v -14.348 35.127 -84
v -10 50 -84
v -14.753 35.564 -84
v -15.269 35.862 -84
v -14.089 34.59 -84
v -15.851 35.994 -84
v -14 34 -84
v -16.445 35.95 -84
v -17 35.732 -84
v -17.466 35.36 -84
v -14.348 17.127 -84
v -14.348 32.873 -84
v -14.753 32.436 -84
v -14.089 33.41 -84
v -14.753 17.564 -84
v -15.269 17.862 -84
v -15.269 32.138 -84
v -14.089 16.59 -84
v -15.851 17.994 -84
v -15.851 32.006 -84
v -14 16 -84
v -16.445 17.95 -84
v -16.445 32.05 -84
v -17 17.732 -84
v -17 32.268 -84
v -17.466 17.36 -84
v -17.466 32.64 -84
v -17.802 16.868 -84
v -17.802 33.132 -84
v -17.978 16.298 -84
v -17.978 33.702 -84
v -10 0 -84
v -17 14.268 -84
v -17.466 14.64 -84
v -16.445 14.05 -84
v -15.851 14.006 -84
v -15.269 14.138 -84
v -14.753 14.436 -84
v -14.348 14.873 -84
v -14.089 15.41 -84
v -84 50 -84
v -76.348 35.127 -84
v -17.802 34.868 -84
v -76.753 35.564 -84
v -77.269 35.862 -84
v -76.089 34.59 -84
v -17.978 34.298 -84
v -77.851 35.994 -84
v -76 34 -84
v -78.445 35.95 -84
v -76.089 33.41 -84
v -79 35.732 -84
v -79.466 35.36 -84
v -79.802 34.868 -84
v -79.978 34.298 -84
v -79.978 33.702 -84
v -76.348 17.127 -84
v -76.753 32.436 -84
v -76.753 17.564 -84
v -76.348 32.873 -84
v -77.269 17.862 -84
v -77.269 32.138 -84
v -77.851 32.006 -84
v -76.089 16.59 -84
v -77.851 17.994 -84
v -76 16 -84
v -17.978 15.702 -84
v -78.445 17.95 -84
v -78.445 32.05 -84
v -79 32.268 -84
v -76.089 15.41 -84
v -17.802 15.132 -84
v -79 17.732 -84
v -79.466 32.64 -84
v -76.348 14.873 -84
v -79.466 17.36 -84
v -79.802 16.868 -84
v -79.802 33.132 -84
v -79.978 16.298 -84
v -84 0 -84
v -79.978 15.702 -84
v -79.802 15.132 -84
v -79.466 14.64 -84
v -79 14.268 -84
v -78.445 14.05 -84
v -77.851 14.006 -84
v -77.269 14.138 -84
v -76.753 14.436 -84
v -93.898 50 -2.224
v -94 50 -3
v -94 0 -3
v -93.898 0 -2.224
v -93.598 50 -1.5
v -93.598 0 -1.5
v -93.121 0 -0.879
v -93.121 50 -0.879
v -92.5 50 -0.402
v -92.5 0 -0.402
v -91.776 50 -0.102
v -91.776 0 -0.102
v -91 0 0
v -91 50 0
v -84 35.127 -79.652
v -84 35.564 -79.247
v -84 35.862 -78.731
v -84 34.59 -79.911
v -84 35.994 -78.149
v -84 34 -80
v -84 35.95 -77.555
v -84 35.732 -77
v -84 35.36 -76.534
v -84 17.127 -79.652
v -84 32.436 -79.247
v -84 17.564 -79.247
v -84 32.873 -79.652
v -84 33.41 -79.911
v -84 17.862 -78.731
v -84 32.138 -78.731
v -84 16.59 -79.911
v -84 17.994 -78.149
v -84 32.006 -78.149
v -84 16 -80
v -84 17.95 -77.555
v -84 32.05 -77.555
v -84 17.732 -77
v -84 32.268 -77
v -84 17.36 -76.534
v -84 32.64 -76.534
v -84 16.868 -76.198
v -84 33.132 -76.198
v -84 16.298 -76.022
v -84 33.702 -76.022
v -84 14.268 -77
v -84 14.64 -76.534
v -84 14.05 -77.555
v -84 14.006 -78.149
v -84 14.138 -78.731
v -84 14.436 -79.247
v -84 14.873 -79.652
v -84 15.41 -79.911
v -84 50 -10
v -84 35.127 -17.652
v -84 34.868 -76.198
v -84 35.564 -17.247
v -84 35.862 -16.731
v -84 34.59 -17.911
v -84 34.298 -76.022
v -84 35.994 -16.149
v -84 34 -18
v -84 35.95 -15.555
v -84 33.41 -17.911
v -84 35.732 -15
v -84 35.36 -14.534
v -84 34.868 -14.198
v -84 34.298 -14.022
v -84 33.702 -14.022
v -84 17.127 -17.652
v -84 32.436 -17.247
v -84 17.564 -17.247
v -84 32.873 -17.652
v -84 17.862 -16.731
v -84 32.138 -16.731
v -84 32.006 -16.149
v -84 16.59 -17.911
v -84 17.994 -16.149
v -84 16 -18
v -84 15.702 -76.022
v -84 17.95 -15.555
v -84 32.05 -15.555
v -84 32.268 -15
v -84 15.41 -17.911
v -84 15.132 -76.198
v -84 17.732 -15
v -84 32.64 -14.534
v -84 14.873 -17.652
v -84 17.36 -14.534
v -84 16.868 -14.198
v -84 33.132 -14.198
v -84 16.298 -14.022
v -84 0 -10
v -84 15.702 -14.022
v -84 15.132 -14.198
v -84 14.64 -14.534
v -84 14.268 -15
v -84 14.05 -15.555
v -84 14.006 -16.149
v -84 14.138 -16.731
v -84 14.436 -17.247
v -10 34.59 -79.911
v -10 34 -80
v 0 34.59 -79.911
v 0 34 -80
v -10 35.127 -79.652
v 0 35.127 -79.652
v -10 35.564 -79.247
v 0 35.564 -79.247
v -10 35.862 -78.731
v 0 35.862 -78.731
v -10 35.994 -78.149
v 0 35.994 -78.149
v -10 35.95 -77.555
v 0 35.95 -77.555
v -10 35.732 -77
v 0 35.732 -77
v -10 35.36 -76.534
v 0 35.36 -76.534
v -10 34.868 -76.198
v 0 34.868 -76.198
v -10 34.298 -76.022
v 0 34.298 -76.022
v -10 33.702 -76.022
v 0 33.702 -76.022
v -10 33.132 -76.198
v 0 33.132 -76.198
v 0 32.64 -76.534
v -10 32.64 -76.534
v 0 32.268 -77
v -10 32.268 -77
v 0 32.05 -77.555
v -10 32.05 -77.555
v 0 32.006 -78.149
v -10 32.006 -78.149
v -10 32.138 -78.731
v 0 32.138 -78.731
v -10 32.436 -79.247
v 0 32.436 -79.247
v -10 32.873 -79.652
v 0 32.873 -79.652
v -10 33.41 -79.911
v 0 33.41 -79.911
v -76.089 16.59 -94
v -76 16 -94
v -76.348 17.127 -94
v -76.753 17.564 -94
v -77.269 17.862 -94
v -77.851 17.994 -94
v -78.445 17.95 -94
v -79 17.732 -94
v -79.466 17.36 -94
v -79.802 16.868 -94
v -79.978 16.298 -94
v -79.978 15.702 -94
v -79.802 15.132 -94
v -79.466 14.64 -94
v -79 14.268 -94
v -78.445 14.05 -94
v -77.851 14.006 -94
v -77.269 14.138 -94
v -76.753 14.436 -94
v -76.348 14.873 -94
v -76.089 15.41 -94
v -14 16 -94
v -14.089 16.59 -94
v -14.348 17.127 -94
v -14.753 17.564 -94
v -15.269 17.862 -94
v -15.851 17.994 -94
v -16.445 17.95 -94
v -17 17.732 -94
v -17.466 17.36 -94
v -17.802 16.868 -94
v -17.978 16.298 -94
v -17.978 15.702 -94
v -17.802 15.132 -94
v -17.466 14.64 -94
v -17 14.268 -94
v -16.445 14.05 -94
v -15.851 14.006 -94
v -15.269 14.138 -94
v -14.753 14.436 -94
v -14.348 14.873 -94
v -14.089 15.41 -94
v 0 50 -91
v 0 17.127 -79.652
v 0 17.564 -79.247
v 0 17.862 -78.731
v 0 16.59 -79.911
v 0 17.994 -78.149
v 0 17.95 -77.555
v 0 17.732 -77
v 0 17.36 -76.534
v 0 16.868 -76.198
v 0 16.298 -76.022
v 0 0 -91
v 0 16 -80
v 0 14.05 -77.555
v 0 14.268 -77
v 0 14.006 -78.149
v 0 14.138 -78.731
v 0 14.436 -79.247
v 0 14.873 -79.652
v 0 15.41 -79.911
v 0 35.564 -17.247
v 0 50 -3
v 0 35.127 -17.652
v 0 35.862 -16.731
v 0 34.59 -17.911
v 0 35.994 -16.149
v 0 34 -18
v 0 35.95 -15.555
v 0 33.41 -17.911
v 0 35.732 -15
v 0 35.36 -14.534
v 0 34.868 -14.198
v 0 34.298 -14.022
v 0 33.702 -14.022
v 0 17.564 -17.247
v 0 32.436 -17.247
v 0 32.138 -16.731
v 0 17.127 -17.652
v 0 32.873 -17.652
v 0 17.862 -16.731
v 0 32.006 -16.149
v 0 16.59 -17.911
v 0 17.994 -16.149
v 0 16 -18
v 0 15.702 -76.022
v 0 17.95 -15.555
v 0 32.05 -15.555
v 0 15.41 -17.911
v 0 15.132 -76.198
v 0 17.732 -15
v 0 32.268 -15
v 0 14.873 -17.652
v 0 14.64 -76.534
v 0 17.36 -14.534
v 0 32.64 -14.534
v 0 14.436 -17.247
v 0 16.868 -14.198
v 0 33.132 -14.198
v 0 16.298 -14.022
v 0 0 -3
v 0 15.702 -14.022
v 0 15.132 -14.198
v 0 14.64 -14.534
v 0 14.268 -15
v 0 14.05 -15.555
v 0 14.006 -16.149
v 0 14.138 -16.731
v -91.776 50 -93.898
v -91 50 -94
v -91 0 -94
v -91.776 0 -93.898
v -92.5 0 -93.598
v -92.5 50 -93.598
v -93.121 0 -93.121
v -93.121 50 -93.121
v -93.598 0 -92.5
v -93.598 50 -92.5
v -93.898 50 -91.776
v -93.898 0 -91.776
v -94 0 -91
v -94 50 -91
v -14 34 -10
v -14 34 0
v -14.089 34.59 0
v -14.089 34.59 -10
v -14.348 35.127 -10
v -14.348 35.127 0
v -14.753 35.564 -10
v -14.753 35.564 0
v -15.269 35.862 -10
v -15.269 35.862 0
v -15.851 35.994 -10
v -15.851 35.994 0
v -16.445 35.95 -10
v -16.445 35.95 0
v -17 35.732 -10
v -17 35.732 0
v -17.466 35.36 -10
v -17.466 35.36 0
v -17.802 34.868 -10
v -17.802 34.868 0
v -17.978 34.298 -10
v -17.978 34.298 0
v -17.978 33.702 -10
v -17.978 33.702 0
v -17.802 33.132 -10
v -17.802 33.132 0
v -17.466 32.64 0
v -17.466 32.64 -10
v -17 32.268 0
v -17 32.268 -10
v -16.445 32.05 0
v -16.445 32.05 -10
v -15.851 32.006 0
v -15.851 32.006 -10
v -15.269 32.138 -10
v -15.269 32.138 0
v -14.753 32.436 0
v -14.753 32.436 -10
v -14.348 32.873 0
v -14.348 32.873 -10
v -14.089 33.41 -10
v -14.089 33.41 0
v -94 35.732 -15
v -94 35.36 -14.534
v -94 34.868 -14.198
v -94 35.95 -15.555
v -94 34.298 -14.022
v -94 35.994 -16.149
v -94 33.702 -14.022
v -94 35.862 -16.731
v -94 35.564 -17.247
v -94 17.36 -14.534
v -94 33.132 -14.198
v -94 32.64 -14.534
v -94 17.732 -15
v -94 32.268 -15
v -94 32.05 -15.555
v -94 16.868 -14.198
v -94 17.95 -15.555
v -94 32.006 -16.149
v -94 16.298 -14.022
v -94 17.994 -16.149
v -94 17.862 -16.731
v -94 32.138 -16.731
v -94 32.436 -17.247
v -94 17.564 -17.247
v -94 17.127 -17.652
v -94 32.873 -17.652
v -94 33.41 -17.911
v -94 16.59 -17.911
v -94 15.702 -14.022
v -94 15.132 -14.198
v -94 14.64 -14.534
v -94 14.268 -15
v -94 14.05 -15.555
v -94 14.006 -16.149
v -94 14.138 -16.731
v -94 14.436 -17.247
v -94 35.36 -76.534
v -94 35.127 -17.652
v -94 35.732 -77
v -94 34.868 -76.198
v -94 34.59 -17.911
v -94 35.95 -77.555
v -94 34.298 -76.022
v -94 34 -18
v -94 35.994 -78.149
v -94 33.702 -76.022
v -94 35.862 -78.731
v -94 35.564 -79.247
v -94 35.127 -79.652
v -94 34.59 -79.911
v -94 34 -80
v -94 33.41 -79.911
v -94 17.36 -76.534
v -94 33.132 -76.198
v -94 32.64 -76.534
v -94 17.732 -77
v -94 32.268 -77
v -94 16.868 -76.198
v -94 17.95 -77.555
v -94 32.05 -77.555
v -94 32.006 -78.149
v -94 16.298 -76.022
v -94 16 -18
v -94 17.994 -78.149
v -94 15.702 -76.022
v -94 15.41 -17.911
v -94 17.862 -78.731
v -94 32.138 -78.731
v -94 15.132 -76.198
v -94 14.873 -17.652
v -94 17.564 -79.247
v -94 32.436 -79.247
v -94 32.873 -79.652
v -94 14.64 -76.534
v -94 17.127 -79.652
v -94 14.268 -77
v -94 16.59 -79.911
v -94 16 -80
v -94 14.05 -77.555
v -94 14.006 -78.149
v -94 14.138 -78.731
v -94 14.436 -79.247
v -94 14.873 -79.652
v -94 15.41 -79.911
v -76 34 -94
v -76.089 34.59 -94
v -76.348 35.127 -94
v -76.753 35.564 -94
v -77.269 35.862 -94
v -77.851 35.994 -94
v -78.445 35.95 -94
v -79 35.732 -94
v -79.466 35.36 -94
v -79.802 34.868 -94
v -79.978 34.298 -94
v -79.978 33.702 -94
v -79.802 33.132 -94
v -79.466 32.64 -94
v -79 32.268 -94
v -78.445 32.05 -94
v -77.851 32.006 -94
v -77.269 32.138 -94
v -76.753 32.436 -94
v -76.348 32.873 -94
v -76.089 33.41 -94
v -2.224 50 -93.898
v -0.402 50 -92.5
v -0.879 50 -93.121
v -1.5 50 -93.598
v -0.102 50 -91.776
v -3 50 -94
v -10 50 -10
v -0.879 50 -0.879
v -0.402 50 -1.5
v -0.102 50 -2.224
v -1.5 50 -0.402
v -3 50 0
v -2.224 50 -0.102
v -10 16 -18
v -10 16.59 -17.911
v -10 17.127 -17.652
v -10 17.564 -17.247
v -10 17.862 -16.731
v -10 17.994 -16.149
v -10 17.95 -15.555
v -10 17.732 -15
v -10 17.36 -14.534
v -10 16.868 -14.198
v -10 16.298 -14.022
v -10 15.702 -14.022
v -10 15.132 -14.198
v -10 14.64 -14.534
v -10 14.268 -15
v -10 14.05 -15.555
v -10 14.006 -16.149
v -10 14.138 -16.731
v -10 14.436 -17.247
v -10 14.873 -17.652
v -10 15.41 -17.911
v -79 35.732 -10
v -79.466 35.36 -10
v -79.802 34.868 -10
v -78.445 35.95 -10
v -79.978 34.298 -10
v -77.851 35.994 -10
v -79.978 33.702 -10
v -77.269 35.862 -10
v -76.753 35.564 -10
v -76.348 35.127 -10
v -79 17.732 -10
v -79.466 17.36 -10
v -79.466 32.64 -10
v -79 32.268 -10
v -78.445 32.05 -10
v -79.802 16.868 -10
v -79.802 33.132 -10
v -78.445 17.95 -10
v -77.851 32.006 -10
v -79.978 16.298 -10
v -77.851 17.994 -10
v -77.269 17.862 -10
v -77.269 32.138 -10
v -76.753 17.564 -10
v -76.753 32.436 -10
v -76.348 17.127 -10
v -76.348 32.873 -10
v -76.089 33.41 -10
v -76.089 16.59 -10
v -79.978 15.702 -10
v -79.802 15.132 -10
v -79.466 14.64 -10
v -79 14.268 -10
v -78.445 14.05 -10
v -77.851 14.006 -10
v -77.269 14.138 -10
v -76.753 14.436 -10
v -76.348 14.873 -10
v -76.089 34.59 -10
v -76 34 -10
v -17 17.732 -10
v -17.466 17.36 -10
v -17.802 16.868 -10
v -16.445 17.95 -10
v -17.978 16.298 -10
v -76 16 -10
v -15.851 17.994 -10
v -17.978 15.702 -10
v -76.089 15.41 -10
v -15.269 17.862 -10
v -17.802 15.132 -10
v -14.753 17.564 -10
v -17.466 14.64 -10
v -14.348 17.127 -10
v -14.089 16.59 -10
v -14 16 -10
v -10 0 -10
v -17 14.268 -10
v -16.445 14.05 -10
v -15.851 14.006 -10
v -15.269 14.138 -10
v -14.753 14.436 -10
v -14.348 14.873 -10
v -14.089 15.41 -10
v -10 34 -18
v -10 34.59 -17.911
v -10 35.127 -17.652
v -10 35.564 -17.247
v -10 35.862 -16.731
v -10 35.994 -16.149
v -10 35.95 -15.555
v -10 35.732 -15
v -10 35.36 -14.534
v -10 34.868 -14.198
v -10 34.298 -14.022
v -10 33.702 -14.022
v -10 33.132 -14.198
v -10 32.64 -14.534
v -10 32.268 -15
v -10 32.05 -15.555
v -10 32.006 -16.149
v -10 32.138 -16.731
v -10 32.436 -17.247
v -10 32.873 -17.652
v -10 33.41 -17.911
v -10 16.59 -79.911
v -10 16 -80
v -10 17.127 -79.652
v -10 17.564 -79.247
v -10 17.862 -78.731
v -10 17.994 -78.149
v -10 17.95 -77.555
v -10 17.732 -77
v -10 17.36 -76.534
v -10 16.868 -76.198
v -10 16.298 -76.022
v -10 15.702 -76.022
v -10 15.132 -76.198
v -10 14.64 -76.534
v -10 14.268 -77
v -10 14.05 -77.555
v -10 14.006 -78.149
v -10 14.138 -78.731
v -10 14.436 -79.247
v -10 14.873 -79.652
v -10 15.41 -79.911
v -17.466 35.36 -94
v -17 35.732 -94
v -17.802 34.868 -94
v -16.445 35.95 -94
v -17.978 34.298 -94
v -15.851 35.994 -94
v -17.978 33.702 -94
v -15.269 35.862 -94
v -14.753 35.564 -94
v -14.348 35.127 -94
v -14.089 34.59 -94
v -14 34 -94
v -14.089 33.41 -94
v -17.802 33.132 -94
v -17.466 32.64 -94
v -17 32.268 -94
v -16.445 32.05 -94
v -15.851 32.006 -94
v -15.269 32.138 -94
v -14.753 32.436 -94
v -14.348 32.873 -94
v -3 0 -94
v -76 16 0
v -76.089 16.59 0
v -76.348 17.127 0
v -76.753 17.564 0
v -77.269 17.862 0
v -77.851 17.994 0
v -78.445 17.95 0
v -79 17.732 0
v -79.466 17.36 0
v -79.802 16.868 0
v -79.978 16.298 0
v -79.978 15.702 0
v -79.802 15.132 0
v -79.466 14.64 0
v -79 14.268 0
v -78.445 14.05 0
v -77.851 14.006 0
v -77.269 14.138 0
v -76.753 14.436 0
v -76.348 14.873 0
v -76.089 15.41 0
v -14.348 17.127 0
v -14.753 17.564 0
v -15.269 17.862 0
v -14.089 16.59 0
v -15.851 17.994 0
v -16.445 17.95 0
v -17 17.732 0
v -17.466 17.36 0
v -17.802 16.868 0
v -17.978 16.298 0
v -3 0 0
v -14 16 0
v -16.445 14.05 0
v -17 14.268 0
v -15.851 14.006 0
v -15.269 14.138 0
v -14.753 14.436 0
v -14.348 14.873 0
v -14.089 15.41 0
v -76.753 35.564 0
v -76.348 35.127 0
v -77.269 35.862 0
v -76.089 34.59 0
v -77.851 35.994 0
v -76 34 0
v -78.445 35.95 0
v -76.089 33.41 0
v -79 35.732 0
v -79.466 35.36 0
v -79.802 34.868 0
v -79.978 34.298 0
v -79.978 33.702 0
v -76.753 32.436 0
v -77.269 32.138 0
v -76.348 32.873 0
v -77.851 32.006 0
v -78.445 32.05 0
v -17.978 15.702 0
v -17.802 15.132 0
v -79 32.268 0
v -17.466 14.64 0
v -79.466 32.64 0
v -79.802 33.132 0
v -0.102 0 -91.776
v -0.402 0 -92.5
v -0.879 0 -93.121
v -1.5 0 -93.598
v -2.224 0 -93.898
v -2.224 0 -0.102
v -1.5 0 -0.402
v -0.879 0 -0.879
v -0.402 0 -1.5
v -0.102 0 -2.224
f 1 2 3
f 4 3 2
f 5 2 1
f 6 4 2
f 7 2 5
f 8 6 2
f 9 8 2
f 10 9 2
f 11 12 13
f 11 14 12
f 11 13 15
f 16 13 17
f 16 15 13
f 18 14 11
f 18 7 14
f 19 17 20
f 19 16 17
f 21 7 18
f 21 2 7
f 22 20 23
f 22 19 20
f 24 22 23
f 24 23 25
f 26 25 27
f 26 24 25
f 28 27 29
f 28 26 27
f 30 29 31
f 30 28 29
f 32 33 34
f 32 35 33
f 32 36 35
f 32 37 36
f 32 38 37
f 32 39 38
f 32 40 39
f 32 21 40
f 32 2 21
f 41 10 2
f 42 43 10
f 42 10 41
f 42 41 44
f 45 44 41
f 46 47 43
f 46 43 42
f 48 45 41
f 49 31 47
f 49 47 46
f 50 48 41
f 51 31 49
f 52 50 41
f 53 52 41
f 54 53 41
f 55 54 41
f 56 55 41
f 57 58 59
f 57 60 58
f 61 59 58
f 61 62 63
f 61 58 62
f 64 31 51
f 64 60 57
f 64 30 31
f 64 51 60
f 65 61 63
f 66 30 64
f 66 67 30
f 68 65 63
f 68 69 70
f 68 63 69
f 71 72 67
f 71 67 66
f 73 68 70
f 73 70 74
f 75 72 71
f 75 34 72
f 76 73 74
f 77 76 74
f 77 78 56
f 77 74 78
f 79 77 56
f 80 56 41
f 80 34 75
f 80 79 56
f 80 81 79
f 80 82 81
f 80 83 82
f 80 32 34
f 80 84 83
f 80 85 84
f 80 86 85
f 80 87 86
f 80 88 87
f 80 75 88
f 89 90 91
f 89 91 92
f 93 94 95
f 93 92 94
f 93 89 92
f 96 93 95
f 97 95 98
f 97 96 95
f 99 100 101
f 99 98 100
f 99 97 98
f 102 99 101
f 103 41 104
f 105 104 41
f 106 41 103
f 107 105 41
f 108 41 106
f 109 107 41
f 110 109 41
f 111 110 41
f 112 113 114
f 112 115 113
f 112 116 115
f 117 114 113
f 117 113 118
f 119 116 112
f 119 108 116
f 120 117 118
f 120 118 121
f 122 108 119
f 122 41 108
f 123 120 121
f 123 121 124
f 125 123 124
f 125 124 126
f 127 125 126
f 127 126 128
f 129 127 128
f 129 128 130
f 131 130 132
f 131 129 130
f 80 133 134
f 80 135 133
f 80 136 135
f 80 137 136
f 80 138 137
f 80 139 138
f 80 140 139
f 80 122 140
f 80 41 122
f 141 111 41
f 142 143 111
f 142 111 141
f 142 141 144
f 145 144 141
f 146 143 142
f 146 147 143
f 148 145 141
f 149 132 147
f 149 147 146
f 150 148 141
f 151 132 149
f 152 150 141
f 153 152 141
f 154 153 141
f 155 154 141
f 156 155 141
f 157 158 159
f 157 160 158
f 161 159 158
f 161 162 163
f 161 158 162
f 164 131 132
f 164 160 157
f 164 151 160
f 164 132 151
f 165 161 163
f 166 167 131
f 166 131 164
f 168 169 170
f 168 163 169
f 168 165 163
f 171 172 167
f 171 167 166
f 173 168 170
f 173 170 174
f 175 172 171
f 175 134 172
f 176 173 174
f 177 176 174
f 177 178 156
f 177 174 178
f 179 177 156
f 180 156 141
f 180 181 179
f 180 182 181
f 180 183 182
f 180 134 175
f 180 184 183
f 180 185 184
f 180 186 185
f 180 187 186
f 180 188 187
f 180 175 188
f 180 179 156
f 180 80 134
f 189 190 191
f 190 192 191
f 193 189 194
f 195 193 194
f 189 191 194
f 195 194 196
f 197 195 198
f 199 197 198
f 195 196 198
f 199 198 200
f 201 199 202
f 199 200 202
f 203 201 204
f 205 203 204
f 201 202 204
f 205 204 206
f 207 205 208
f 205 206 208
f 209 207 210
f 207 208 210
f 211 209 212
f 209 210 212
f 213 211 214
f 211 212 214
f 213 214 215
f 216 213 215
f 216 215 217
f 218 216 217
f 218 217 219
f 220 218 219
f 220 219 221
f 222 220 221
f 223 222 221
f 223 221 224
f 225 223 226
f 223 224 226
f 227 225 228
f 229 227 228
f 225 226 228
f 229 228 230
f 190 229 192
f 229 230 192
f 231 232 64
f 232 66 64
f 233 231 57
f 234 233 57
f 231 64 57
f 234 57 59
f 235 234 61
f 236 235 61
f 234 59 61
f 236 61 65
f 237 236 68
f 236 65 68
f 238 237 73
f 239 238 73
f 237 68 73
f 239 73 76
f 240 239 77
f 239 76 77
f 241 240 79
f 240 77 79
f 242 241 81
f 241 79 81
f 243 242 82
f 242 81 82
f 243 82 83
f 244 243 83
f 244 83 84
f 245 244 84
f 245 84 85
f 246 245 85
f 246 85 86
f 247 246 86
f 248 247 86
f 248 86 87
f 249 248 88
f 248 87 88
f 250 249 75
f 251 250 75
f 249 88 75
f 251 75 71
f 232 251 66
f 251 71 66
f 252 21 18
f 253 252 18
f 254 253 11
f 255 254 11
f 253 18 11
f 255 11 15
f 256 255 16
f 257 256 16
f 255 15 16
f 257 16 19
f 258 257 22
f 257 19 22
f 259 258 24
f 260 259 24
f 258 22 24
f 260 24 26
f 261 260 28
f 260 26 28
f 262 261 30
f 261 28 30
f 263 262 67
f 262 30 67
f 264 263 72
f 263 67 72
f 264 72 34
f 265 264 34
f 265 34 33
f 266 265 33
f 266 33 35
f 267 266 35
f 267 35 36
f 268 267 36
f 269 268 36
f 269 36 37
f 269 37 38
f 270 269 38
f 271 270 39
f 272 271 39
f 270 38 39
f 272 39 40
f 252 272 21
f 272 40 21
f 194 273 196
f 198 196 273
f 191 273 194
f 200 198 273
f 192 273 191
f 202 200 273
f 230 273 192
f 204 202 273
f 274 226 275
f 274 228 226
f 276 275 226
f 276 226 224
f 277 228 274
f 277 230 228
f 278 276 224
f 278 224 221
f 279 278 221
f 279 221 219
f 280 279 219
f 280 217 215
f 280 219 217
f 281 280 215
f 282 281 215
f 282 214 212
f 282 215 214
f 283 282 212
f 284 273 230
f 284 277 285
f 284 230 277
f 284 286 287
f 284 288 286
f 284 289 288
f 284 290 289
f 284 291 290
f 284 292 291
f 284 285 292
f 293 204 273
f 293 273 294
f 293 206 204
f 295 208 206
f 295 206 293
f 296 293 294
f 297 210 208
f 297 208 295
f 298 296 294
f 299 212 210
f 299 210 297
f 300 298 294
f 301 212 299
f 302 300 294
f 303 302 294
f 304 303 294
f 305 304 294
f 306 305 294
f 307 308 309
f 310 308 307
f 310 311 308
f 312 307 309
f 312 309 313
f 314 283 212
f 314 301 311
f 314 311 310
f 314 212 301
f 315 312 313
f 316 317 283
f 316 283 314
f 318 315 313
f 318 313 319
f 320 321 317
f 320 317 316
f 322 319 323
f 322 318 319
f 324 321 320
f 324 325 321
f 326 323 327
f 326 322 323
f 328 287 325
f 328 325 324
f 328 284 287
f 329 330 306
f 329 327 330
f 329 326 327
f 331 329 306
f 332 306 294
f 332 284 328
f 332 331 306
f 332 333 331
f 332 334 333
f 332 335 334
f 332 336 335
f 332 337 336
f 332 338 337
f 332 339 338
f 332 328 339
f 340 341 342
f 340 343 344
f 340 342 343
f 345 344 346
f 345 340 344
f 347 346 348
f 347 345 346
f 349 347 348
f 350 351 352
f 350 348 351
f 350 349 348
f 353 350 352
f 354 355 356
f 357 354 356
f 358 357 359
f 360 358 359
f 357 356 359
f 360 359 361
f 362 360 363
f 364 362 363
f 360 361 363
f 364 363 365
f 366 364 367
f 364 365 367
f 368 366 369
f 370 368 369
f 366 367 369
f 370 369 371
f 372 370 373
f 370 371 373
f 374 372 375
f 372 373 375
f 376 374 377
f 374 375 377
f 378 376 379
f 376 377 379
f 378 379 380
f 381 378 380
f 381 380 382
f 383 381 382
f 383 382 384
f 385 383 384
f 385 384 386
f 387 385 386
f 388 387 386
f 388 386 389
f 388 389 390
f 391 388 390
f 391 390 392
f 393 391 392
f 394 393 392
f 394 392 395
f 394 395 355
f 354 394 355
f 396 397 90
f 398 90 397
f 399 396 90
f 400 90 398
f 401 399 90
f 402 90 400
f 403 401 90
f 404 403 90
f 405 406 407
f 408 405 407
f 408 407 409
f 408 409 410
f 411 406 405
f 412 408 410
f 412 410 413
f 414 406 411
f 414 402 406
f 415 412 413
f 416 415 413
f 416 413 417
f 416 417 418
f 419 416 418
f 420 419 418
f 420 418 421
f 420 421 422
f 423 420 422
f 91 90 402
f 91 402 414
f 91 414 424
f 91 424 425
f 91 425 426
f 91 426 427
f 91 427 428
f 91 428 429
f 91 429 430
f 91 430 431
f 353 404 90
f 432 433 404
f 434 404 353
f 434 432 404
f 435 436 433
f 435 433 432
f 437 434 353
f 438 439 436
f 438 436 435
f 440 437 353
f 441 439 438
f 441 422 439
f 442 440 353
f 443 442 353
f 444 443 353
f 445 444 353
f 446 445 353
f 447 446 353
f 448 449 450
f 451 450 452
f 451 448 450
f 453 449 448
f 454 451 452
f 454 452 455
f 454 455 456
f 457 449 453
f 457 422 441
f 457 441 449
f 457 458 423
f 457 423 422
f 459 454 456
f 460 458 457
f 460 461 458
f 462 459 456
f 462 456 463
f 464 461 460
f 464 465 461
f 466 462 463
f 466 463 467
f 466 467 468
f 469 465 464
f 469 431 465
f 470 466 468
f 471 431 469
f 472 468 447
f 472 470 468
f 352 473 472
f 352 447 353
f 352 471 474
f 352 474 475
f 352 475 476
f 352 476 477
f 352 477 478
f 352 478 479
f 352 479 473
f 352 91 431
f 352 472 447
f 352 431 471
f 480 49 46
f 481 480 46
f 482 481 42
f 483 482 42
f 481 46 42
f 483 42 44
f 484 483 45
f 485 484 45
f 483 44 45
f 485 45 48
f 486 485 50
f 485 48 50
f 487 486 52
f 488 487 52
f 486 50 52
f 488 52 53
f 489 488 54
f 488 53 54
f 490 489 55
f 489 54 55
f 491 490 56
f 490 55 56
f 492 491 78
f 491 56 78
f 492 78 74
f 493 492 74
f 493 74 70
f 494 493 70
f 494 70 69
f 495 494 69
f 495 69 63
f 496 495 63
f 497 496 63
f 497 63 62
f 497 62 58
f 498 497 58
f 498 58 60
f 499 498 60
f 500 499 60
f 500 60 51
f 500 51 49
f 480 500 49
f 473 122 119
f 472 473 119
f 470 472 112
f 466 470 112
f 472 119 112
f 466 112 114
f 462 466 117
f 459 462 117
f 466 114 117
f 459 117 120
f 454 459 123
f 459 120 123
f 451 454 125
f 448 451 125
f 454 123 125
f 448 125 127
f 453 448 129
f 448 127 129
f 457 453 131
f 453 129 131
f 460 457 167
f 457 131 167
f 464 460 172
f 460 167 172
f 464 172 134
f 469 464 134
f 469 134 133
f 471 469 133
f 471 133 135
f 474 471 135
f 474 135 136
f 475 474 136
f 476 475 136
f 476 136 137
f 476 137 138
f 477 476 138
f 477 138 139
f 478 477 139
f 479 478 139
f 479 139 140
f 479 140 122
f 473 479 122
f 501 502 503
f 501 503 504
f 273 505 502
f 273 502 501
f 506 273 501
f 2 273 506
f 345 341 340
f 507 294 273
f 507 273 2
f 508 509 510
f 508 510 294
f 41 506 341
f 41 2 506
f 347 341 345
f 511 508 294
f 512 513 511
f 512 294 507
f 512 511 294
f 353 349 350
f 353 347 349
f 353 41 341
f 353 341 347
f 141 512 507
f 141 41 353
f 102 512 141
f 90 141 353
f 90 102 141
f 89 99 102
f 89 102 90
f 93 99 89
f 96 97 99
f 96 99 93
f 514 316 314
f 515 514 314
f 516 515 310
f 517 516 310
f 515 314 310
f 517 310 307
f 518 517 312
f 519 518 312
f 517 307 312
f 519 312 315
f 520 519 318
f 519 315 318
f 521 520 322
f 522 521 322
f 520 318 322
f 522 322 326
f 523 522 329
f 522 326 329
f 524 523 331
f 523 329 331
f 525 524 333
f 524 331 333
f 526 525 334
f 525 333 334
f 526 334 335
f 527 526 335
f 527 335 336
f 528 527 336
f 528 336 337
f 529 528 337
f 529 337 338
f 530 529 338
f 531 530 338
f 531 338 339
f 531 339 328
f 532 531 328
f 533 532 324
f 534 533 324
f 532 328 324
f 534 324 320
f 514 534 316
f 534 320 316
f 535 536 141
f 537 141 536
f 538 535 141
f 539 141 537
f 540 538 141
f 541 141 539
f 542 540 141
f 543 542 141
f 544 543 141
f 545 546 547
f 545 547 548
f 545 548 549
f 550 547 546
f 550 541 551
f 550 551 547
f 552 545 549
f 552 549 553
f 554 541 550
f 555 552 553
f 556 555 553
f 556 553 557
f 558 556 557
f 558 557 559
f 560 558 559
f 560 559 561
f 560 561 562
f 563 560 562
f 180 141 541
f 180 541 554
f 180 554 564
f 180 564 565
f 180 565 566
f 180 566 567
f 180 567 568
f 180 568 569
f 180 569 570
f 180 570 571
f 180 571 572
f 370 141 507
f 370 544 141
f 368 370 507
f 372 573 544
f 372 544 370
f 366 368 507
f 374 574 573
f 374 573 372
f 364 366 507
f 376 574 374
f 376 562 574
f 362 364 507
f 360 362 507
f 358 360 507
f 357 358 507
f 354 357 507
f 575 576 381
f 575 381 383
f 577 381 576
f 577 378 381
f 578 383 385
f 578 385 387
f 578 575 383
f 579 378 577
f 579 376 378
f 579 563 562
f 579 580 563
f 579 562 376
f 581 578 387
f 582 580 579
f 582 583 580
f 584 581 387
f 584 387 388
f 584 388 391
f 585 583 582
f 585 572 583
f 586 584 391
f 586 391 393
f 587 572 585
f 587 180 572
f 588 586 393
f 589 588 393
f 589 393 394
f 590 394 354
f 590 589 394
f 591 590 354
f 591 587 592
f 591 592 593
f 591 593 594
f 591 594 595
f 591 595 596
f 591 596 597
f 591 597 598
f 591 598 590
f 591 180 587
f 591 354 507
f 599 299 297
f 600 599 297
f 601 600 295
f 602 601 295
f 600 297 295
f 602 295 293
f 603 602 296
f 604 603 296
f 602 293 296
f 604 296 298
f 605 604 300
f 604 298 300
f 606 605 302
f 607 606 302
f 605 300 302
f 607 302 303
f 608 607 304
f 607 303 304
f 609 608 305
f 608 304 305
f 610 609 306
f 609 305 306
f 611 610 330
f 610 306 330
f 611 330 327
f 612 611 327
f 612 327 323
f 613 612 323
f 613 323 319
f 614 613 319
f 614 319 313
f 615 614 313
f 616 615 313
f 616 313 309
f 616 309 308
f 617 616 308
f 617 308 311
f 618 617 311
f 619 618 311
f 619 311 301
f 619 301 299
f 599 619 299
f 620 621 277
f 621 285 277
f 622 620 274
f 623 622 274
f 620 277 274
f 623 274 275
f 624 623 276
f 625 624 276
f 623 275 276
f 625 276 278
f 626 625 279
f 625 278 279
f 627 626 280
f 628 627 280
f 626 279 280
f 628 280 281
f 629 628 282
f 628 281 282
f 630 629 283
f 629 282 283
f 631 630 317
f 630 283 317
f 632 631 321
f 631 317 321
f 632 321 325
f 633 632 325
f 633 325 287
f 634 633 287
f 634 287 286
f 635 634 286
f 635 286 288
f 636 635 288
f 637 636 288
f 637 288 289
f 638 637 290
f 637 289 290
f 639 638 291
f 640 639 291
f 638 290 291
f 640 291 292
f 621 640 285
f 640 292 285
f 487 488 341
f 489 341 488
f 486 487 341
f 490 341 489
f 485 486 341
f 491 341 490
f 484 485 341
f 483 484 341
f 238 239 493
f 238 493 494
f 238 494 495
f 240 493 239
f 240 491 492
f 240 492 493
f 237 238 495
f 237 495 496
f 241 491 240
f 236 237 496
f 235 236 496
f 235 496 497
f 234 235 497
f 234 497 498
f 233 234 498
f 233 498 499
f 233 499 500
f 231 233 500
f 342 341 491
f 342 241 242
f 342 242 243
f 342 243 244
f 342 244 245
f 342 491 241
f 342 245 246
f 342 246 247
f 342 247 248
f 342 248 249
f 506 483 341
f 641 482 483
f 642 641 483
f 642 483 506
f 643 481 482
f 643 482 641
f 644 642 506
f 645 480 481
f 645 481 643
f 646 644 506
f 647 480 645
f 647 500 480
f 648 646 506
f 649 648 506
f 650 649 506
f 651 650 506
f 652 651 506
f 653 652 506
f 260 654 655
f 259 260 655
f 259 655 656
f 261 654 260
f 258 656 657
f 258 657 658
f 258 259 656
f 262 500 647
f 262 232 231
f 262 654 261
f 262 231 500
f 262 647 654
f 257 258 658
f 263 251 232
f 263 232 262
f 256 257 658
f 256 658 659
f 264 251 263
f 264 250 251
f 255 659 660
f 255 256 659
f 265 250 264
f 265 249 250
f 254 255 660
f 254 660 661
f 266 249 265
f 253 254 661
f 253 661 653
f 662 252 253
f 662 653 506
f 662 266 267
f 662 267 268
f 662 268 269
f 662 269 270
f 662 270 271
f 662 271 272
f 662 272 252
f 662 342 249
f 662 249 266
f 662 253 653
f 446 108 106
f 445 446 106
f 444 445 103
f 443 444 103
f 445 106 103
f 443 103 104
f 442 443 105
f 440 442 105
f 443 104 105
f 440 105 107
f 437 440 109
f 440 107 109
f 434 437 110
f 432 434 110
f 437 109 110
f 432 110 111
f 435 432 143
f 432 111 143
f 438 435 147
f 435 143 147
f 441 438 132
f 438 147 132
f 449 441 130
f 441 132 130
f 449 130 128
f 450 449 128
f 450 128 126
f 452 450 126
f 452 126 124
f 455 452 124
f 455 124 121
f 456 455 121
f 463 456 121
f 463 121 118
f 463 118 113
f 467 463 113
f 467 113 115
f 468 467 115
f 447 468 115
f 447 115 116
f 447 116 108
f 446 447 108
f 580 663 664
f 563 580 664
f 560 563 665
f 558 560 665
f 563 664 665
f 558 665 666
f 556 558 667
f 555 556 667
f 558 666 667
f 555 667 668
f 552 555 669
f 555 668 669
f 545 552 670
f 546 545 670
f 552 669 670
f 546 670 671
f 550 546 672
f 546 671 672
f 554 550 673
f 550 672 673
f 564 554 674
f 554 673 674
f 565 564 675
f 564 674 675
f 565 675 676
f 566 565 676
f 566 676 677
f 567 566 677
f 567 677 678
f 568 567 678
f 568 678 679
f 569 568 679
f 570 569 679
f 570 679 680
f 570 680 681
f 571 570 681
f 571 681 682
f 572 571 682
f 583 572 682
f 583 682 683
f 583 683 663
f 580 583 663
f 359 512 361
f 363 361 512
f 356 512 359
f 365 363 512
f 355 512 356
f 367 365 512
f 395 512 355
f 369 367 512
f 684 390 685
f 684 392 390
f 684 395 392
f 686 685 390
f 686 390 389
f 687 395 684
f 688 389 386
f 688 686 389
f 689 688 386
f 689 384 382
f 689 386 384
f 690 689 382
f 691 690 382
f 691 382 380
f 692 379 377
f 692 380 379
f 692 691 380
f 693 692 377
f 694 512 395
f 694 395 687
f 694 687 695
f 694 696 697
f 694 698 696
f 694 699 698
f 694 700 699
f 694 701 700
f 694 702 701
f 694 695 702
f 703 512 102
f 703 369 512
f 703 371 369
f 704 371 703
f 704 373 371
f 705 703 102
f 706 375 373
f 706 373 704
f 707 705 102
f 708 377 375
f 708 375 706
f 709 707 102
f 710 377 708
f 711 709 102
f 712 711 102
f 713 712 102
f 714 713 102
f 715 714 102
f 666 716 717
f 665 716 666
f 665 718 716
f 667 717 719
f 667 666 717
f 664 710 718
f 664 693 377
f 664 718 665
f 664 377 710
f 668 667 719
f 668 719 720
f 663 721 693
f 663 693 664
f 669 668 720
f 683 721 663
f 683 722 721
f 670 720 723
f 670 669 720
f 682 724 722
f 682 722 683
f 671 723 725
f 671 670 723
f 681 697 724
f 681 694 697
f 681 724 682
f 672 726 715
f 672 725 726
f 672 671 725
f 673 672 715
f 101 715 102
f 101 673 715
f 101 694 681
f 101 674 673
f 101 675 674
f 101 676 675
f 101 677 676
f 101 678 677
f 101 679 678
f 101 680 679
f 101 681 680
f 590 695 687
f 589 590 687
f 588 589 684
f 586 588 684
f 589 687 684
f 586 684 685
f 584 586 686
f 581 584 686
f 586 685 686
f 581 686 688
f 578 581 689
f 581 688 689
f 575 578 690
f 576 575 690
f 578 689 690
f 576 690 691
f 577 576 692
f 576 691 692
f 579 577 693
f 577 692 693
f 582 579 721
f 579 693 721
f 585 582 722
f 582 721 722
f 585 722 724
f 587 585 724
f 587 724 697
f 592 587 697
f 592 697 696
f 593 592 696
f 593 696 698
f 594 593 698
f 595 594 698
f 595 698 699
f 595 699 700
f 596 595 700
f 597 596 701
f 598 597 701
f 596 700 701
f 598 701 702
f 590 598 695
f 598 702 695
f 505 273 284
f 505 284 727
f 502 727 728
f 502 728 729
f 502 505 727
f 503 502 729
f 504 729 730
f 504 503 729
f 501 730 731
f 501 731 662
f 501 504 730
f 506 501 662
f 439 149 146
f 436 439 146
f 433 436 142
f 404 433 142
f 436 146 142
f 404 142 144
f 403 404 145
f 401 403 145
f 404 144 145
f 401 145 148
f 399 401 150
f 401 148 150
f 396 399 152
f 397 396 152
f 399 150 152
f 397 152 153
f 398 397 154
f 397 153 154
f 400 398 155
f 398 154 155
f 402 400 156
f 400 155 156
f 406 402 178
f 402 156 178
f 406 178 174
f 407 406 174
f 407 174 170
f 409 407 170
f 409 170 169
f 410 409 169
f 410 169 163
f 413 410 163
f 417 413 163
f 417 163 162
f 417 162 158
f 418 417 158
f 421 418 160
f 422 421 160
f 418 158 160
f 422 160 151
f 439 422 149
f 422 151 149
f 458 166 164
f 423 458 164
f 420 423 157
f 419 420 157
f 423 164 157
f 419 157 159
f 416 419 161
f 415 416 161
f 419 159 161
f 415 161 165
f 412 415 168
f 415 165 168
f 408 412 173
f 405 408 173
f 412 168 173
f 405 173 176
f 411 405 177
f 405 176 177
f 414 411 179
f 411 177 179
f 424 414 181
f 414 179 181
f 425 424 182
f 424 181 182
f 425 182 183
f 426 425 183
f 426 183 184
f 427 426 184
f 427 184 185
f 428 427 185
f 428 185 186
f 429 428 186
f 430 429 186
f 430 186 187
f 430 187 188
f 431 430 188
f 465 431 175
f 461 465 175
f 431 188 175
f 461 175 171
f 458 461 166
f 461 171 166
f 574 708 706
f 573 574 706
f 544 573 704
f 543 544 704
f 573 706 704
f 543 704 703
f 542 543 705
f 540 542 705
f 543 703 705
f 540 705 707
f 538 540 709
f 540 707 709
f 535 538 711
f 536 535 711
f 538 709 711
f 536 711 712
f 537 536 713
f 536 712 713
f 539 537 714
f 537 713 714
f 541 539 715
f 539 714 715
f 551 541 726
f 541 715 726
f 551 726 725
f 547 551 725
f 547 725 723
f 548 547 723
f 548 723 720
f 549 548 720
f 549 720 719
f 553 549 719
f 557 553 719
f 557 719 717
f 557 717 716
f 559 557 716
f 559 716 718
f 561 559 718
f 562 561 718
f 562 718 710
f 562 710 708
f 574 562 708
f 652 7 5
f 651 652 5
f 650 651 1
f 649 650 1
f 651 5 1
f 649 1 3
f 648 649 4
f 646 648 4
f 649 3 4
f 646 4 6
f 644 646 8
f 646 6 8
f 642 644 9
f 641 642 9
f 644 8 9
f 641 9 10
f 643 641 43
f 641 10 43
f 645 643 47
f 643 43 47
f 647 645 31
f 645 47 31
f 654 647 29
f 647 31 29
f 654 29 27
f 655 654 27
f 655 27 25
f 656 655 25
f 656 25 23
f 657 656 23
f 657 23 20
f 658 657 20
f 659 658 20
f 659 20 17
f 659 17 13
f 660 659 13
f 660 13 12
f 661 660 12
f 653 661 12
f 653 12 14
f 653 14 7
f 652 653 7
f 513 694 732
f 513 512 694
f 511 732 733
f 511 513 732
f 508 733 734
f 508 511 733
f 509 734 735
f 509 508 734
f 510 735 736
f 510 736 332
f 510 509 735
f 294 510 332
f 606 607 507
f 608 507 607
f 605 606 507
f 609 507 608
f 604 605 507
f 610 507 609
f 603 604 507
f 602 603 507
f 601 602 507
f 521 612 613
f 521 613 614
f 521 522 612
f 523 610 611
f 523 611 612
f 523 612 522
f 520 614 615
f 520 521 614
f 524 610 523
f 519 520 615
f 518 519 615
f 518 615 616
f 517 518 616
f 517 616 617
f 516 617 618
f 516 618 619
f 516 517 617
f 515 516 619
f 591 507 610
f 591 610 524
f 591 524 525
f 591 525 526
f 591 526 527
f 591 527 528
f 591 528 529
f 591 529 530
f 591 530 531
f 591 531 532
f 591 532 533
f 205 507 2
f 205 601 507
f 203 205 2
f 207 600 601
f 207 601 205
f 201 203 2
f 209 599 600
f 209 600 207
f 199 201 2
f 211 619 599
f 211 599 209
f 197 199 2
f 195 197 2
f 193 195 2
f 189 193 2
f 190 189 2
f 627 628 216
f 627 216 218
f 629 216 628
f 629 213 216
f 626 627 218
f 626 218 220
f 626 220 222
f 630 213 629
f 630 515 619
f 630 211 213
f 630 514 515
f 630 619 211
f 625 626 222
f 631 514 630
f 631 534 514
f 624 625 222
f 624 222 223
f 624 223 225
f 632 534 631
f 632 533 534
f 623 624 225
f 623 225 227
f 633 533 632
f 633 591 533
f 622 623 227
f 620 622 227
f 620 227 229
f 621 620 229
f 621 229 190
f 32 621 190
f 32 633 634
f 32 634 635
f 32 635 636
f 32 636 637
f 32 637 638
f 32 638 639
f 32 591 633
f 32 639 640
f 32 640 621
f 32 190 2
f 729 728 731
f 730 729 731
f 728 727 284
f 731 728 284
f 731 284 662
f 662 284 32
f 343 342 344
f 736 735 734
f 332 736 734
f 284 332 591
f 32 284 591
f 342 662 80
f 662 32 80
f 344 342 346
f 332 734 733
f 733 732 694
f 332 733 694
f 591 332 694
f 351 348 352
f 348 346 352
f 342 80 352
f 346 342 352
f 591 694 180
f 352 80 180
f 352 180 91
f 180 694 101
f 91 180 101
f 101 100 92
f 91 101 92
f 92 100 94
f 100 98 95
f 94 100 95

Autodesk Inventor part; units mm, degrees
ref_plane "YZ Plane" through (0, 0, 0) normal (1, 0, 0) x (0, 1, 0)
ref_plane "XZ Plane" through (0, 0, 0) normal (0, 1, 0) x (-1, 0, 0)
ref_plane "XY Plane" through (0, 0, 0) normal (0, 0, 1) x (1, 0, 0)
sketch "Sketch1" plane through (0, 0, 0) normal (0, 1, 0) x (-1, 0, 0)
  line L0 (0, 0) -> (94, 0)
  line L1 (94, 0) -> (94, -94)
  line L2 (94, -94) -> (0, -94)
  line L3 (0, -94) -> (0, 0)
  line L4 (84, -10) -> (10, -10)
  line L5 (10, -10) -> (10, -84)
  line L6 (10, -84) -> (84, -84)
  line L7 (84, -84) -> (84, -10)
  line L8 (47, 0) -> (47, -10) construction
  line L9 (10, -47) -> (0, -47) construction
  dimension "d1" = 74
  dimension "d3" = 10
extrude "Extrusion1" add sketch "Sketch1" along normal blind 50
sketch "Sketch2" plane through (-94, 0, 0) normal (0, 0, 1) x (1, 0, 0)
  line L0 (10, 50) -> (84, 50) construction
  line L1 (16, 50) -> (16, 34) construction
  line L2 (16, 16) -> (16, 0) construction
  line L3 (16, 34) -> (0, 34) construction
  line L4 (0, 0) -> (0, 50) construction
  line L5 (78, 50) -> (78, 34) construction
  line L6 (78, 34) -> (94, 34) construction
  line L7 (94, 0) -> (94, 50) construction
  line L8 (94, 16) -> (78, 16) construction
  line L9 (78, 16) -> (78, 0) construction
  circle A0 centre (16, 34) radius 2
  circle A1 centre (78, 34) radius 2
  circle A2 centre (78, 16) radius 2
  circle A3 centre (16, 16) radius 2
  line L10 (0, 0) -> (94, 0) construction
  dimension "boarder_to_hole" = 16
  dimension "d7" = 4
extrude "Extrusion2" cut sketch "Sketch2" against normal up to surface (94 mm away)
sketch "Sketch3" plane through (0, 0, 0) normal (1, 0, 0) x (0, 0, -1)
  line L0 (0, 50) -> (60.8888, 50) construction
  line L1 (16, 50) -> (16, 34) construction
  line L2 (16, 16) -> (16, 0) construction
  line L3 (16, 34) -> (0, 34) construction
  line L4 (0, 0) -> (0, 50) construction
  line L5 (78, 50) -> (78, 34) construction
  line L6 (78, 34) -> (94, 34) construction
  line L7 (94, 0) -> (94, 49.9084) construction
  line L8 (94, 16) -> (78, 16) construction
  line L9 (78, 16) -> (78, 0) construction
  circle A0 centre (16, 34) radius 2
  circle A1 centre (78, 34) radius 2
  circle A2 centre (78, 16) radius 2
  circle A3 centre (16, 16) radius 2
  line L10 (0, 0) -> (94, 0) construction
  line L11 (0, 50) -> (94, 50) projected
  dimension "d10" = 16
  dimension "d13" = 4
extrude "Extrusion3" cut sketch "Sketch3" against normal up to surface (94 mm away)
fillet "Fillet1" radius 3 4 edges at (0, 25, 0) (-94, 25, 0) (-94, 25, -94) (0, 25, -94)
equation "\"d3\" = square_thickness"
equation "\"d7\" = screw_size"
equation "\"d10\" = boarder_to_hole"
equation "\"d13\" = screw_size"
equation "\"square_thickness\" = 10"
equation "\"screw_size\" = 4"
properties part number "centerlegg_mounting_bracket"
